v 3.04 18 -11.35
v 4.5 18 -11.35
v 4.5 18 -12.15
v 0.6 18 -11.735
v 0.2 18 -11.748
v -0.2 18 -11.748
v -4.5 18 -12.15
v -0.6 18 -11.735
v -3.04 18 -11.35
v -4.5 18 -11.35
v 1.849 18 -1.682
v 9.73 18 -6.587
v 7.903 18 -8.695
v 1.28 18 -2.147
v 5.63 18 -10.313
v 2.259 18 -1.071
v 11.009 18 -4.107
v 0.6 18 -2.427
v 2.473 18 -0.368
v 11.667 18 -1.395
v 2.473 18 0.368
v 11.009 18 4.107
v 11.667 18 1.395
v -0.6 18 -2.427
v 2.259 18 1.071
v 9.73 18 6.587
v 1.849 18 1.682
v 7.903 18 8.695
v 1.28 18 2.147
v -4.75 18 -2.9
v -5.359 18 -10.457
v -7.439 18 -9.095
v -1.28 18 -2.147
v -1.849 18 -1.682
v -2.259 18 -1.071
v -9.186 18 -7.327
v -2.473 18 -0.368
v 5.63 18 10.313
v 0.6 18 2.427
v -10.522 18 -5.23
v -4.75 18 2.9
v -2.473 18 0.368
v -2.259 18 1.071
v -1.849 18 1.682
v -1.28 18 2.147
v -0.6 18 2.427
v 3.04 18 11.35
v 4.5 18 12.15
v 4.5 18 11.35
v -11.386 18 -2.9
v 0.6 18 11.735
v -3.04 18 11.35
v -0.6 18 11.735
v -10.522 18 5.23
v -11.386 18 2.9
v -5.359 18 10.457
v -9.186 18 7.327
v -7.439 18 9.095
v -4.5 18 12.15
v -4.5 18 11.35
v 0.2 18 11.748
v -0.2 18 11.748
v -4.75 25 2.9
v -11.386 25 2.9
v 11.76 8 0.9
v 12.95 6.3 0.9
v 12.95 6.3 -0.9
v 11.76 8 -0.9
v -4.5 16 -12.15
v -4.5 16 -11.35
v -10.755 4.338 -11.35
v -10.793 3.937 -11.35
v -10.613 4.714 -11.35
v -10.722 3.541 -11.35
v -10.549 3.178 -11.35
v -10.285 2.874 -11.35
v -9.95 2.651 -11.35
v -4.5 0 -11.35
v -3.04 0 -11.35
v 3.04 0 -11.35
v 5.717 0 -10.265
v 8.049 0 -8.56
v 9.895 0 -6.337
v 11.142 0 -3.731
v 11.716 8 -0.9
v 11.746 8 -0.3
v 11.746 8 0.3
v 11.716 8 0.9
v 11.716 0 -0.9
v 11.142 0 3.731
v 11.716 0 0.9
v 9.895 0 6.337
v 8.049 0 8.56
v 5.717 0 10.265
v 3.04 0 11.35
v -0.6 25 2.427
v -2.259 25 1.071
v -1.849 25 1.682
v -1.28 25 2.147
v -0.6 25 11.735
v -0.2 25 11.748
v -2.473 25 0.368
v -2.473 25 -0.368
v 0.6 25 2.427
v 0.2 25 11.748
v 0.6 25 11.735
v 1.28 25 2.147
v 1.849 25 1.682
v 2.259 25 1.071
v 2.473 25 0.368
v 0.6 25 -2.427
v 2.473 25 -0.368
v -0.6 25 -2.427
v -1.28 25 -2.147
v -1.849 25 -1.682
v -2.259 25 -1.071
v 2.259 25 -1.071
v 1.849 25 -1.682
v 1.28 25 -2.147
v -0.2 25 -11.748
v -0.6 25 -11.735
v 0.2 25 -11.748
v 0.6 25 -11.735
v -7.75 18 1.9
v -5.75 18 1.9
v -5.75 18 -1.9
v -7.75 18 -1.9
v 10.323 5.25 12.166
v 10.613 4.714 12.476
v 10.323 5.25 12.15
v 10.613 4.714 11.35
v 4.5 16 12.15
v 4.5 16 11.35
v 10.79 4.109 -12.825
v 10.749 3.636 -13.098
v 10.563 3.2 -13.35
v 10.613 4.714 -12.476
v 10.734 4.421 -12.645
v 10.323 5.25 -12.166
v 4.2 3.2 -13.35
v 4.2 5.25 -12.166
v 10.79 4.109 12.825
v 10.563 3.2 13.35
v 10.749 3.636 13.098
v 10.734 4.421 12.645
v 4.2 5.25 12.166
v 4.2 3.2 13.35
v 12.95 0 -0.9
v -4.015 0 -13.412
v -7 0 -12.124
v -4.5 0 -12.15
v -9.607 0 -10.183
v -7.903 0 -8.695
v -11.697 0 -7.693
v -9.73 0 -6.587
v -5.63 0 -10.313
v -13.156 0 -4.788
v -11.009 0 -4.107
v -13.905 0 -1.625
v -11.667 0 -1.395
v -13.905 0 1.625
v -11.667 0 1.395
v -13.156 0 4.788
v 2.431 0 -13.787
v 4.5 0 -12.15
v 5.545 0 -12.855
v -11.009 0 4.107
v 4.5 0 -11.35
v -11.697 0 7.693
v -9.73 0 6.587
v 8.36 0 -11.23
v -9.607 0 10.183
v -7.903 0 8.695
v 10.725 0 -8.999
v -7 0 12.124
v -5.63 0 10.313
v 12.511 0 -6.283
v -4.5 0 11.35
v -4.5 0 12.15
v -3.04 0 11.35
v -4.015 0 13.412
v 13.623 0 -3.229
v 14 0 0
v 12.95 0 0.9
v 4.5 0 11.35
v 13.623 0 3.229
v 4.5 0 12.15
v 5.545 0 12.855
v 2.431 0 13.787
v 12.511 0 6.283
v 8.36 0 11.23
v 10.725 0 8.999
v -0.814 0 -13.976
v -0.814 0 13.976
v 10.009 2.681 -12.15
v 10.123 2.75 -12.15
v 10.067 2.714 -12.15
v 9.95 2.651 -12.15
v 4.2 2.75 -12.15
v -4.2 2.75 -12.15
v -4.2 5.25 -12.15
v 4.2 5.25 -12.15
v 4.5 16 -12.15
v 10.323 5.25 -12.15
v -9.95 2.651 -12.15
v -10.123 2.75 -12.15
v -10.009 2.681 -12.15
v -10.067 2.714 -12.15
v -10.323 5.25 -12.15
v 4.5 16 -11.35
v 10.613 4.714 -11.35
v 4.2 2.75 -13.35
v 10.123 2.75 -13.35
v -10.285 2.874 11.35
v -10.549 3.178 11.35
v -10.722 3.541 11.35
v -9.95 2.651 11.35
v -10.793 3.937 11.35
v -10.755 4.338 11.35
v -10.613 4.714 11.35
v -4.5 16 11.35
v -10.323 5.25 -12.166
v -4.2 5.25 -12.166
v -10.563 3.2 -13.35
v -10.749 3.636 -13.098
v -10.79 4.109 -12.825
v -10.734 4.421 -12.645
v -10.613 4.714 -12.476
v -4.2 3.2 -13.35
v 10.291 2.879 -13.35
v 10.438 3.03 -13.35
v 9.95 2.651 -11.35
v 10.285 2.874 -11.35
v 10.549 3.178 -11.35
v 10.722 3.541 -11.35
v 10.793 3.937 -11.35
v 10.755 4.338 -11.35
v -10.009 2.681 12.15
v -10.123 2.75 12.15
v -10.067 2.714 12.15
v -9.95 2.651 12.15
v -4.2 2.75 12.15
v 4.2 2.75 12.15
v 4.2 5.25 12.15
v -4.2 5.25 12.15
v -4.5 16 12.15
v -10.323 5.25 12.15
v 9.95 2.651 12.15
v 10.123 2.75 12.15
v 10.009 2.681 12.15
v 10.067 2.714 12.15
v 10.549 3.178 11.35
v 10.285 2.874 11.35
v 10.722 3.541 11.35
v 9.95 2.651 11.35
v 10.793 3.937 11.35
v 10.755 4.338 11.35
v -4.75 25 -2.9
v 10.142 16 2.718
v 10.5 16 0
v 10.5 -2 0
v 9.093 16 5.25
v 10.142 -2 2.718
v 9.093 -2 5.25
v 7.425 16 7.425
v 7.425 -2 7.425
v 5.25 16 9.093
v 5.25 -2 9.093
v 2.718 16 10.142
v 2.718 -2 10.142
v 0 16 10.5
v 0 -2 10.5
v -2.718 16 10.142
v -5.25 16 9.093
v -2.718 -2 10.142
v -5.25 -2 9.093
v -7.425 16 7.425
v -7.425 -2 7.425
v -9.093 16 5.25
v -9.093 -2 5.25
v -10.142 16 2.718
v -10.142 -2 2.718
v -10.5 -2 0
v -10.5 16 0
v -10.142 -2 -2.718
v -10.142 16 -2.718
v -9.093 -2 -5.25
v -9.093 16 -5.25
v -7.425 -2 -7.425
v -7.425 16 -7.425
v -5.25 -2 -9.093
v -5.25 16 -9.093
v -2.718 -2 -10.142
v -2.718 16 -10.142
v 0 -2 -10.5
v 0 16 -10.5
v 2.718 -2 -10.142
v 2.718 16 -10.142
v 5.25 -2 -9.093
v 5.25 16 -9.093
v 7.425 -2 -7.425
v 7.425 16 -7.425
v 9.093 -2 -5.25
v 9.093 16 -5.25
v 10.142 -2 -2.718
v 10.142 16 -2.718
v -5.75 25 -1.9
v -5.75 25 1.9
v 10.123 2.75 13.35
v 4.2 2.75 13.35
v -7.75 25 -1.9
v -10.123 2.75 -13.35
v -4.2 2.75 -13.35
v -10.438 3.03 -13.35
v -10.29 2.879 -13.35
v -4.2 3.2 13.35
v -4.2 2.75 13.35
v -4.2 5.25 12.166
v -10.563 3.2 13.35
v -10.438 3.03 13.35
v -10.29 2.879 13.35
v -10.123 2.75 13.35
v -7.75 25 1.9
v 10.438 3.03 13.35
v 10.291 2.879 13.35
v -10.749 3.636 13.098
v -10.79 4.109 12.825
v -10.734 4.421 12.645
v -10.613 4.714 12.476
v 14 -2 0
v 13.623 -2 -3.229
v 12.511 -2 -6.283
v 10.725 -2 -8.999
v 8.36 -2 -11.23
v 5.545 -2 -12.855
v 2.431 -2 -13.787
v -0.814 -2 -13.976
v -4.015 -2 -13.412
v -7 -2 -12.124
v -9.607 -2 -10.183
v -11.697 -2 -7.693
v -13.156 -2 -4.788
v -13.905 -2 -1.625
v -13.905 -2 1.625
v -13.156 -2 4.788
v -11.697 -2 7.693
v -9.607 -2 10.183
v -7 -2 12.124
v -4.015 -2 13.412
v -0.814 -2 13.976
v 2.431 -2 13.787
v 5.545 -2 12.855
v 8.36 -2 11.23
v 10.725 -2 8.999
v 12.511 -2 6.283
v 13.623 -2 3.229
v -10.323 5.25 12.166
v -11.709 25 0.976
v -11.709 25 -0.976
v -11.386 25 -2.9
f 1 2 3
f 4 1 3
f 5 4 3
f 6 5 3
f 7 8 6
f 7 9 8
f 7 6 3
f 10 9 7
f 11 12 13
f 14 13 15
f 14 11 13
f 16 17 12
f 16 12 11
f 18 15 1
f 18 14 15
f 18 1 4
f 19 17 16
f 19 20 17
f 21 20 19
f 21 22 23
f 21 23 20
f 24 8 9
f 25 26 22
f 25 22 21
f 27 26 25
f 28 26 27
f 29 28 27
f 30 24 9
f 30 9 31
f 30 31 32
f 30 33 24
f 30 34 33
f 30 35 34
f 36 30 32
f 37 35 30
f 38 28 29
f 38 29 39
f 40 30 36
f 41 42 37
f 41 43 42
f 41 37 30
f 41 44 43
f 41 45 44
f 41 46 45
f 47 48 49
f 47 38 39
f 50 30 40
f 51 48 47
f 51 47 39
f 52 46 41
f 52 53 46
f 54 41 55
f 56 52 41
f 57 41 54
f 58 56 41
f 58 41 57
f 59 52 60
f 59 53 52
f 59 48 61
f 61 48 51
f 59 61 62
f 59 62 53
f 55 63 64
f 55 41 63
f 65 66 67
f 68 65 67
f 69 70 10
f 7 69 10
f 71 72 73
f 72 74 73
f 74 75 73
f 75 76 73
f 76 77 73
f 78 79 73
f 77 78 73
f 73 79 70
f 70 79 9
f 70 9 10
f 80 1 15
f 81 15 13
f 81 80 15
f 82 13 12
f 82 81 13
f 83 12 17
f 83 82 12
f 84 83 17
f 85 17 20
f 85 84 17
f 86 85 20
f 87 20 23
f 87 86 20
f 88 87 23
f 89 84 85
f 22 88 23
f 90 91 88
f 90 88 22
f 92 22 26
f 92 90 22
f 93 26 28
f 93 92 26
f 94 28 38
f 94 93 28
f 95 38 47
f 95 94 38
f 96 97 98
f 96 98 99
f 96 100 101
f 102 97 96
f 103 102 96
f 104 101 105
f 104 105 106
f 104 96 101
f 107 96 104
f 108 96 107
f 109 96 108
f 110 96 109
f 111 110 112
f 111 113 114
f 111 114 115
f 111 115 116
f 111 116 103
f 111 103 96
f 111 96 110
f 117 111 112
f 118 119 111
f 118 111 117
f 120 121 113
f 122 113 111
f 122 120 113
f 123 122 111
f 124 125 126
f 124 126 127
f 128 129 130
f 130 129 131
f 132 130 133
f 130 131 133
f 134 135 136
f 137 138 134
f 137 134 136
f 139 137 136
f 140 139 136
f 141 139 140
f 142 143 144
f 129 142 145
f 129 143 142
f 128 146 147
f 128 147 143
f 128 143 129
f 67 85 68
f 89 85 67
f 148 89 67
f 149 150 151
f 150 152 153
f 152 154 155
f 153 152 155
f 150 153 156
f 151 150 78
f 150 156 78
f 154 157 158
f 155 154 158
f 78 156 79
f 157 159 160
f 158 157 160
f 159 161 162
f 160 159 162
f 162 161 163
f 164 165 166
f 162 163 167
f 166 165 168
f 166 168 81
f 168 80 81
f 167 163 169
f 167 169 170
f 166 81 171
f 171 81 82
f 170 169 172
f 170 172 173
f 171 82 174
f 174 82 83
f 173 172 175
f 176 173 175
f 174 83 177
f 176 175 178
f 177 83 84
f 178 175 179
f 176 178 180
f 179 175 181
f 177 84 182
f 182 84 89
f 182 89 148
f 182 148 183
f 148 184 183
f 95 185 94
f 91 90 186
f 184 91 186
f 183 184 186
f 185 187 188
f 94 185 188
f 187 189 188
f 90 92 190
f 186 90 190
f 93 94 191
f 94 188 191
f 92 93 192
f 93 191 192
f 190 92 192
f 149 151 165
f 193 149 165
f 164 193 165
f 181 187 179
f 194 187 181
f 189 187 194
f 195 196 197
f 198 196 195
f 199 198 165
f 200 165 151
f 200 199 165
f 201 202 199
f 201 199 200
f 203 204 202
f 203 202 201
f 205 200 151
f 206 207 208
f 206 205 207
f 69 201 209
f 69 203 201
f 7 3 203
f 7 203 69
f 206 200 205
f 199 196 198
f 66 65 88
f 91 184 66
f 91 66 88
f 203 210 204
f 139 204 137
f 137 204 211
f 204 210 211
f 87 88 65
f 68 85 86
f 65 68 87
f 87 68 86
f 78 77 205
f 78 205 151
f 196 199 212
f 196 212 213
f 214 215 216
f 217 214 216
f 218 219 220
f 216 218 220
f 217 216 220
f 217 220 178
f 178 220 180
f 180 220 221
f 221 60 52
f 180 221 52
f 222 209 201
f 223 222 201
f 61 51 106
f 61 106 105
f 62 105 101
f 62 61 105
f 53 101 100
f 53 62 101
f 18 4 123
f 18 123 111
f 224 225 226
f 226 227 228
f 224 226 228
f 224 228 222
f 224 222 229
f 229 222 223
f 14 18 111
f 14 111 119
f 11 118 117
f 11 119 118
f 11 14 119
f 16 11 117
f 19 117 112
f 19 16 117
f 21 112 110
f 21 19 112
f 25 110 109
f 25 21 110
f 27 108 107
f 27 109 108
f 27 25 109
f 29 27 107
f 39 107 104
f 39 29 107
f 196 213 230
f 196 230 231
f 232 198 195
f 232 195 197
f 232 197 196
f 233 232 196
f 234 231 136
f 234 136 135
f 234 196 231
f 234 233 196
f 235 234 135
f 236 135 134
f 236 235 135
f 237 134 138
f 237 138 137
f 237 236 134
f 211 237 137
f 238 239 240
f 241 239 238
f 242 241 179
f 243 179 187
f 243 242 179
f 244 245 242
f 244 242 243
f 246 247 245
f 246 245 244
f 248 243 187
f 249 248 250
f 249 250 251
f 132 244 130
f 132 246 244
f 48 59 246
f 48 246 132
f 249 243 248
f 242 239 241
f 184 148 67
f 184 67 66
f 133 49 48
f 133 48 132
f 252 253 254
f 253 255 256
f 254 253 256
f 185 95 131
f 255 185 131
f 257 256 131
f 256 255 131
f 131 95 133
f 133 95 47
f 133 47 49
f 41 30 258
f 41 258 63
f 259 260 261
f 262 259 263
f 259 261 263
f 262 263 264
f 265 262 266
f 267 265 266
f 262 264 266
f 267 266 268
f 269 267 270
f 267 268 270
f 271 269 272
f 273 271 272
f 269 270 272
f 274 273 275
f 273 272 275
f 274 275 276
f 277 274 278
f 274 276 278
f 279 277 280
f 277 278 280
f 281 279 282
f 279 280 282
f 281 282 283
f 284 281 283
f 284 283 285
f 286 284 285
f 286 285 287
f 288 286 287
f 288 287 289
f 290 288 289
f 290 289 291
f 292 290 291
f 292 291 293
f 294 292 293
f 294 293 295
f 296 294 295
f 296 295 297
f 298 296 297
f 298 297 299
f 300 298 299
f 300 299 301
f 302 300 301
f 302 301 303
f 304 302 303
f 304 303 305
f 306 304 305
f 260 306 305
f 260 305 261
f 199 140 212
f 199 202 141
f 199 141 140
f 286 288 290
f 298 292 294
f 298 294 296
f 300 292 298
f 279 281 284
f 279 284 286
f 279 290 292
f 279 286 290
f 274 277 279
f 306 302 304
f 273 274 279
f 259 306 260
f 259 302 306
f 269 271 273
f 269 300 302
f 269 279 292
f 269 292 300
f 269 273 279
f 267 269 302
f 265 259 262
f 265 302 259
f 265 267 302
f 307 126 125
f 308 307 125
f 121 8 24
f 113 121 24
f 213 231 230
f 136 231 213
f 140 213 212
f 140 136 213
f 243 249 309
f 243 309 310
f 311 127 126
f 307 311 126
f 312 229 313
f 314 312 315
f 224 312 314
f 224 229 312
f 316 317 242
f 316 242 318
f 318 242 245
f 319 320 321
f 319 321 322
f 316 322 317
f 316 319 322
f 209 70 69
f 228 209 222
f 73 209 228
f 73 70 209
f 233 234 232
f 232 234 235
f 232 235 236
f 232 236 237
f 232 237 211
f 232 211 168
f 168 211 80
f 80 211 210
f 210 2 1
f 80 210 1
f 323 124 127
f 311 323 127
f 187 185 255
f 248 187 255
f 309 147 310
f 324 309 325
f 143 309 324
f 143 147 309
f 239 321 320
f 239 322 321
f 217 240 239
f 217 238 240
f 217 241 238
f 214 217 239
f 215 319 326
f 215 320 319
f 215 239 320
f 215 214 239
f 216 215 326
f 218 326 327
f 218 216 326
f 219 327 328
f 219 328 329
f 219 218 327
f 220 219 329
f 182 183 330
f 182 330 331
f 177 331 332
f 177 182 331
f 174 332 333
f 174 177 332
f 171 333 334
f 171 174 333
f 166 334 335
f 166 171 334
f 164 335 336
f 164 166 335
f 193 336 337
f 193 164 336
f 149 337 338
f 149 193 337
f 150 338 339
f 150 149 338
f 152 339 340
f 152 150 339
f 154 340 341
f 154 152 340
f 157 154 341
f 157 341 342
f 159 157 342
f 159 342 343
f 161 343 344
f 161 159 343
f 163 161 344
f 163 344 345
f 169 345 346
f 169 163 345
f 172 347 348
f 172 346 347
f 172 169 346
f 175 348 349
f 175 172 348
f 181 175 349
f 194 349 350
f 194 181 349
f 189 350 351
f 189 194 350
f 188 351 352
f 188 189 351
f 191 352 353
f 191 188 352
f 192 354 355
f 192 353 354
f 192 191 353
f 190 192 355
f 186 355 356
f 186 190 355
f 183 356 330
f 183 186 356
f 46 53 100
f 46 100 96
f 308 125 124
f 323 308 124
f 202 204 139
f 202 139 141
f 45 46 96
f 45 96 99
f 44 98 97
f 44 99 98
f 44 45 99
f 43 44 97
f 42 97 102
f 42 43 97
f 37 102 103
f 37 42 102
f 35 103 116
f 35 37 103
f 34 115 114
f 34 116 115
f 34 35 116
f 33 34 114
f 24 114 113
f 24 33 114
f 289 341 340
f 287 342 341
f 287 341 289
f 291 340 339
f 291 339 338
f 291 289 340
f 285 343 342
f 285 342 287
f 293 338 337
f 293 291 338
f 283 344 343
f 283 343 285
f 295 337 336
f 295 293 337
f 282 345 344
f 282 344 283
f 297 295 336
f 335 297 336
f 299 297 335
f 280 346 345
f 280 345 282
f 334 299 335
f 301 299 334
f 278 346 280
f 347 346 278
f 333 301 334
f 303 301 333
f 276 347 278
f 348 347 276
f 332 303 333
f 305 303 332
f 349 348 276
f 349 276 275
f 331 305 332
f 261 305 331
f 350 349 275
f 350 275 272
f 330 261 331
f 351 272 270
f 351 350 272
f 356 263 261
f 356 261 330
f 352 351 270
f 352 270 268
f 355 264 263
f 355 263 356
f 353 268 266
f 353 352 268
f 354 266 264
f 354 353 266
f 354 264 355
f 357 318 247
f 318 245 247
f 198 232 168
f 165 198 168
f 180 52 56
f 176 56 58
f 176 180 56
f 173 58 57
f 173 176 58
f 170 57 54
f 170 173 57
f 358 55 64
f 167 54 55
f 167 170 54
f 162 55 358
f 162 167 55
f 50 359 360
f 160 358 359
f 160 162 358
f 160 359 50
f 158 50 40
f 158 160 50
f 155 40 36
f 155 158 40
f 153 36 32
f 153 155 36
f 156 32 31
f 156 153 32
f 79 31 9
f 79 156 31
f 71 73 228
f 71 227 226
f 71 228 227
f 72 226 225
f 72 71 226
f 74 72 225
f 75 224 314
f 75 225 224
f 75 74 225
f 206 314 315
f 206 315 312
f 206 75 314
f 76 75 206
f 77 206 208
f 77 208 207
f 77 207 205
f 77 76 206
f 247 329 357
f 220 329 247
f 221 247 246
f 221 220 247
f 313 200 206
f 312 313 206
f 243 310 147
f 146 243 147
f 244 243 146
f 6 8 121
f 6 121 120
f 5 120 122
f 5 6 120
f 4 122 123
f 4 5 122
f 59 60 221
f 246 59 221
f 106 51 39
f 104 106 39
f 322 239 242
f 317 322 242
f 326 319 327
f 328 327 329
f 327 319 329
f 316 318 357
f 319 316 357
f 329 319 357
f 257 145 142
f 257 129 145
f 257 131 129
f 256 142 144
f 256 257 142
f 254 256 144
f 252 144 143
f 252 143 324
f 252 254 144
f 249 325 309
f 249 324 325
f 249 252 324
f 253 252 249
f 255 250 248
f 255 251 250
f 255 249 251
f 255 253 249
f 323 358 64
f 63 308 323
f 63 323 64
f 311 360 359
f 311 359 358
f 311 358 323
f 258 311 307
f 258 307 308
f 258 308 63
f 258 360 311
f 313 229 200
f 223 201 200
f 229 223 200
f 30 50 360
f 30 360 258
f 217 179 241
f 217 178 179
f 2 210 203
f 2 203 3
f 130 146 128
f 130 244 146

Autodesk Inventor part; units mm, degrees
ref_plane "YZ Plane" through (0, 0, 0) normal (1, 0, 0) x (0, 1, 0)
ref_plane "XZ Plane" through (0, 0, 0) normal (0, 1, 0) x (-1, 0, 0)
sketch "Эскиз1" plane through (0, 0, 0) normal (0, 1, 0) x (-1, 0, 0)
  circle A0 centre (0, 0) radius 11.75
  dimension "d0" = 23.5
extrude "Выдавливание1" add sketch "Эскиз1" along normal blind 18
sketch "Эскиз2" plane through (0, 0, 0) normal (0, -1, 0) x (1, 0, 0)
  circle A0 centre (0, 0) radius 14
  dimension "d3" = 28
extrude "Выдавливание2" add sketch "Эскиз2" along normal blind 2
sketch "Эскиз3" plane through (0, 18, 0) normal (0, 1, 0) x (1, 0, 0)
  line L0 (0, 11.75) -> (0, -11.75) construction
  line L1 (-0.6, 11.7347) -> (-0.6, 2.4269)
  line L2 (0.6, 11.7347) -> (0.6, 2.4269)
  line L3 (-11.75, 0) -> (11.75, 0) construction
  line L4 (-0.6, -11.7347) -> (-0.6, -2.4269)
  line L5 (0.6, -11.7347) -> (0.6, -2.4269)
  arc A0 (-0.6, 2.4269) -> (-0.6, -2.4269) centre (0, 0) ccw
  arc A1 (0.6, -2.4269) -> (0.6, 2.4269) centre (0, 0) ccw
  circle A2 centre (0, 0) radius 11.75 projected
  line L6 (-11.3865, 2.9) -> (-4.75, 2.9)
  line L7 (-4.75, 2.9) -> (-4.75, -2.9)
  line L8 (-4.75, -2.9) -> (-11.3865, -2.9)
  line L9 (-7.75, 1.9) -> (-5.75, 1.9)
  line L10 (-5.75, 1.9) -> (-5.75, -1.9)
  line L11 (-5.75, -1.9) -> (-7.75, -1.9)
  line L12 (-7.75, -1.9) -> (-7.75, 1.9)
  dimension "d7" = 1.2
  dimension "d8" = 2.5
  dimension "d12" = 5.8
  dimension "d13" = 7
  dimension "d14" = 1
  dimension "d15" = 1
  dimension "d16" = 1
  dimension "d17" = 2
extrude "Выдавливание3" add sketch "Эскиз3" along normal blind 7 contours A2 L2 A1 L5 L4 A0 L1 | L6 L7 L8 A2
sketch "Эскиз4" plane through (0, -2, 0) normal (0, -1, 0) x (1, 0, 0)
  circle A0 centre (0, 0) radius 10.5
  dimension "d18" = 21
extrude "Выдавливание4" cut sketch "Эскиз4" against normal blind 18
sketch "Эскиз5" plane through (0, 0, 0) normal (0, 1, 0) x (1, 0, 0)
  arc A0 (0.6, -11.7347) -> (0.6, 11.7347) centre (0, 0) ccw projected
  line L0 (11.7155, 0.9) -> (12.95, 0.9)
  line L1 (12.95, 0.9) -> (12.95, -0.9)
  line L2 (12.95, -0.9) -> (11.7155, -0.9)
  line L3 (0, 0) -> (19.973, 0) construction
  point P0 (11.75, 0)
  point P1 (11.75, 0)
  dimension "d21" = 1.8
  dimension "d22" = 1.2
extrude "Выдавливание5" add sketch "Эскиз5" along normal blind 8
chamfer "Фаска1" distance 1.7 angle 35 1 edges at (12.95, 8, 0) measured on face at (12.95, 2.6667, -0.3)
ref_plane "РабПлоскость1" through (0, 0, 11.75) normal (0, 0, 1) x (1, 0, 0)
sketch "Эскиз7" plane through (0, 0, 11.75) normal (0, 0, 1) x (1, 0, 0)
  line L0 (11.75, 18) -> (0.6, 18) projected
  line L1 (-0.6, 18) -> (-11.3865, 18) projected
  line L2 (0, 18) -> (4.5, 18)
  line L3 (4.5, 18) -> (4.5, 16)
  line L4 (4.5, 0) -> (0, 0)
  line L5 (14, 0) -> (-14, 0) projected
  line L6 (0.6, 18) -> (-0.6, 18) construction
  line L7 (0, 18) -> (0, 0) construction
  line L8 (4.5, 0) -> (9.9502, 2.6511)
  line L9 (10.613, 4.7144) -> (4.5, 16)
  arc A0 (9.9502, 2.6511) -> (10.613, 4.7144) centre (9.2941, 4) ccw
  line L10 (0, 18) -> (-4.5, 18)
  line L11 (-4.5, 18) -> (-4.5, 16)
  line L12 (-4.5, 0) -> (0, 0)
  line L13 (-4.5, 0) -> (-9.9502, 2.6511)
  line L14 (-10.613, 4.7144) -> (-4.5, 16)
  arc A1 (-10.613, 4.7144) -> (-9.9502, 2.6511) centre (-9.2941, 4) ccw
  point P0 (11, 4)
  dimension "d30" = 9
  dimension "d31" = 4
  dimension "d32" = 22
  dimension "d33" = 1.5
  dimension "d34" = 2
  dimension "d35" = 154.061
extrude "Выдавливание6" add sketch "Эскиз7" along normal mid plane 0.8
mirror "Зеркальное отражение1" about plane through (0, 0, 0) normal (0, 0, 1) of "Выдавливание6"
sketch "Эскиз9" plane through (0, 0, 12.15) normal (0, 0, 1) x (1, 0, 0)
  line L0 (4.5, 0) -> (-4.5, 0) projected
  line L1 (4.5, 0) -> (9.9502, 2.6511) projected
  arc A0 (9.9502, 2.6511) -> (10.613, 4.7144) centre (9.2941, 4) ccw projected
  line L2 (10.613, 4.7144) -> (4.5, 16) projected
  line L3 (4.5, 16) -> (4.5, 18) projected
  line L4 (4.5, 18) -> (-4.5, 18) projected
  line L5 (-4.5, 18) -> (-4.5, 16) projected
  line L6 (-4.5, 16) -> (-10.613, 4.7144) projected
  arc A1 (-10.613, 4.7144) -> (-9.9502, 2.6511) centre (-9.2941, 4) ccw projected
  line L7 (-9.9502, 2.6511) -> (-4.5, 0) projected
  line L8 (4.2, 5.25) -> (10.3229, 5.25)
  line L9 (10.1232, 2.75) -> (4.2, 2.75)
  line L10 (4.2, 2.75) -> (4.2, 5.25)
  line L11 (0, 18) -> (0, 0) construction
  line L12 (9.2941, 4) -> (-9.2941, 4) construction
  arc A2 (-10.613, 4.7144) -> (-9.9502, 2.6511) centre (-9.2941, 4) ccw
  line L13 (-4.2, 5.25) -> (-10.3229, 5.25)
  line L14 (-10.1232, 2.75) -> (-4.2, 2.75)
  line L15 (-4.2, 2.75) -> (-4.2, 5.25)
  dimension "d40" = 4.2
  dimension "d43" = 2.5
extrude "Выдавливание8" add sketch "Эскиз9" along normal blind 1.2 contours L9 L10 L8 L2 A0 | A1 L6 L13 L15 L14
chamfer "Фаска2" distance 2.05 angle 30 1 edges at (7.2615, 5.25, 13.35) measured on face at (8.2154, 4.4167, 13.35)
chamfer "Фаска3" distance 2.05 angle 30 1 edges at (-7.2615, 5.25, 13.35) measured on face at (-8.2154, 4.4167, 13.35)
mirror "Зеркальное отражение2" about plane through (0, 0, 0) normal (0, 0, 1) of "Выдавливание8", "Фаска2", "Фаска3"
equation "\"d15\" = d14"
equation "\"d16\" = d14"
properties material "Пластмасса, непрозрачная, черная"
